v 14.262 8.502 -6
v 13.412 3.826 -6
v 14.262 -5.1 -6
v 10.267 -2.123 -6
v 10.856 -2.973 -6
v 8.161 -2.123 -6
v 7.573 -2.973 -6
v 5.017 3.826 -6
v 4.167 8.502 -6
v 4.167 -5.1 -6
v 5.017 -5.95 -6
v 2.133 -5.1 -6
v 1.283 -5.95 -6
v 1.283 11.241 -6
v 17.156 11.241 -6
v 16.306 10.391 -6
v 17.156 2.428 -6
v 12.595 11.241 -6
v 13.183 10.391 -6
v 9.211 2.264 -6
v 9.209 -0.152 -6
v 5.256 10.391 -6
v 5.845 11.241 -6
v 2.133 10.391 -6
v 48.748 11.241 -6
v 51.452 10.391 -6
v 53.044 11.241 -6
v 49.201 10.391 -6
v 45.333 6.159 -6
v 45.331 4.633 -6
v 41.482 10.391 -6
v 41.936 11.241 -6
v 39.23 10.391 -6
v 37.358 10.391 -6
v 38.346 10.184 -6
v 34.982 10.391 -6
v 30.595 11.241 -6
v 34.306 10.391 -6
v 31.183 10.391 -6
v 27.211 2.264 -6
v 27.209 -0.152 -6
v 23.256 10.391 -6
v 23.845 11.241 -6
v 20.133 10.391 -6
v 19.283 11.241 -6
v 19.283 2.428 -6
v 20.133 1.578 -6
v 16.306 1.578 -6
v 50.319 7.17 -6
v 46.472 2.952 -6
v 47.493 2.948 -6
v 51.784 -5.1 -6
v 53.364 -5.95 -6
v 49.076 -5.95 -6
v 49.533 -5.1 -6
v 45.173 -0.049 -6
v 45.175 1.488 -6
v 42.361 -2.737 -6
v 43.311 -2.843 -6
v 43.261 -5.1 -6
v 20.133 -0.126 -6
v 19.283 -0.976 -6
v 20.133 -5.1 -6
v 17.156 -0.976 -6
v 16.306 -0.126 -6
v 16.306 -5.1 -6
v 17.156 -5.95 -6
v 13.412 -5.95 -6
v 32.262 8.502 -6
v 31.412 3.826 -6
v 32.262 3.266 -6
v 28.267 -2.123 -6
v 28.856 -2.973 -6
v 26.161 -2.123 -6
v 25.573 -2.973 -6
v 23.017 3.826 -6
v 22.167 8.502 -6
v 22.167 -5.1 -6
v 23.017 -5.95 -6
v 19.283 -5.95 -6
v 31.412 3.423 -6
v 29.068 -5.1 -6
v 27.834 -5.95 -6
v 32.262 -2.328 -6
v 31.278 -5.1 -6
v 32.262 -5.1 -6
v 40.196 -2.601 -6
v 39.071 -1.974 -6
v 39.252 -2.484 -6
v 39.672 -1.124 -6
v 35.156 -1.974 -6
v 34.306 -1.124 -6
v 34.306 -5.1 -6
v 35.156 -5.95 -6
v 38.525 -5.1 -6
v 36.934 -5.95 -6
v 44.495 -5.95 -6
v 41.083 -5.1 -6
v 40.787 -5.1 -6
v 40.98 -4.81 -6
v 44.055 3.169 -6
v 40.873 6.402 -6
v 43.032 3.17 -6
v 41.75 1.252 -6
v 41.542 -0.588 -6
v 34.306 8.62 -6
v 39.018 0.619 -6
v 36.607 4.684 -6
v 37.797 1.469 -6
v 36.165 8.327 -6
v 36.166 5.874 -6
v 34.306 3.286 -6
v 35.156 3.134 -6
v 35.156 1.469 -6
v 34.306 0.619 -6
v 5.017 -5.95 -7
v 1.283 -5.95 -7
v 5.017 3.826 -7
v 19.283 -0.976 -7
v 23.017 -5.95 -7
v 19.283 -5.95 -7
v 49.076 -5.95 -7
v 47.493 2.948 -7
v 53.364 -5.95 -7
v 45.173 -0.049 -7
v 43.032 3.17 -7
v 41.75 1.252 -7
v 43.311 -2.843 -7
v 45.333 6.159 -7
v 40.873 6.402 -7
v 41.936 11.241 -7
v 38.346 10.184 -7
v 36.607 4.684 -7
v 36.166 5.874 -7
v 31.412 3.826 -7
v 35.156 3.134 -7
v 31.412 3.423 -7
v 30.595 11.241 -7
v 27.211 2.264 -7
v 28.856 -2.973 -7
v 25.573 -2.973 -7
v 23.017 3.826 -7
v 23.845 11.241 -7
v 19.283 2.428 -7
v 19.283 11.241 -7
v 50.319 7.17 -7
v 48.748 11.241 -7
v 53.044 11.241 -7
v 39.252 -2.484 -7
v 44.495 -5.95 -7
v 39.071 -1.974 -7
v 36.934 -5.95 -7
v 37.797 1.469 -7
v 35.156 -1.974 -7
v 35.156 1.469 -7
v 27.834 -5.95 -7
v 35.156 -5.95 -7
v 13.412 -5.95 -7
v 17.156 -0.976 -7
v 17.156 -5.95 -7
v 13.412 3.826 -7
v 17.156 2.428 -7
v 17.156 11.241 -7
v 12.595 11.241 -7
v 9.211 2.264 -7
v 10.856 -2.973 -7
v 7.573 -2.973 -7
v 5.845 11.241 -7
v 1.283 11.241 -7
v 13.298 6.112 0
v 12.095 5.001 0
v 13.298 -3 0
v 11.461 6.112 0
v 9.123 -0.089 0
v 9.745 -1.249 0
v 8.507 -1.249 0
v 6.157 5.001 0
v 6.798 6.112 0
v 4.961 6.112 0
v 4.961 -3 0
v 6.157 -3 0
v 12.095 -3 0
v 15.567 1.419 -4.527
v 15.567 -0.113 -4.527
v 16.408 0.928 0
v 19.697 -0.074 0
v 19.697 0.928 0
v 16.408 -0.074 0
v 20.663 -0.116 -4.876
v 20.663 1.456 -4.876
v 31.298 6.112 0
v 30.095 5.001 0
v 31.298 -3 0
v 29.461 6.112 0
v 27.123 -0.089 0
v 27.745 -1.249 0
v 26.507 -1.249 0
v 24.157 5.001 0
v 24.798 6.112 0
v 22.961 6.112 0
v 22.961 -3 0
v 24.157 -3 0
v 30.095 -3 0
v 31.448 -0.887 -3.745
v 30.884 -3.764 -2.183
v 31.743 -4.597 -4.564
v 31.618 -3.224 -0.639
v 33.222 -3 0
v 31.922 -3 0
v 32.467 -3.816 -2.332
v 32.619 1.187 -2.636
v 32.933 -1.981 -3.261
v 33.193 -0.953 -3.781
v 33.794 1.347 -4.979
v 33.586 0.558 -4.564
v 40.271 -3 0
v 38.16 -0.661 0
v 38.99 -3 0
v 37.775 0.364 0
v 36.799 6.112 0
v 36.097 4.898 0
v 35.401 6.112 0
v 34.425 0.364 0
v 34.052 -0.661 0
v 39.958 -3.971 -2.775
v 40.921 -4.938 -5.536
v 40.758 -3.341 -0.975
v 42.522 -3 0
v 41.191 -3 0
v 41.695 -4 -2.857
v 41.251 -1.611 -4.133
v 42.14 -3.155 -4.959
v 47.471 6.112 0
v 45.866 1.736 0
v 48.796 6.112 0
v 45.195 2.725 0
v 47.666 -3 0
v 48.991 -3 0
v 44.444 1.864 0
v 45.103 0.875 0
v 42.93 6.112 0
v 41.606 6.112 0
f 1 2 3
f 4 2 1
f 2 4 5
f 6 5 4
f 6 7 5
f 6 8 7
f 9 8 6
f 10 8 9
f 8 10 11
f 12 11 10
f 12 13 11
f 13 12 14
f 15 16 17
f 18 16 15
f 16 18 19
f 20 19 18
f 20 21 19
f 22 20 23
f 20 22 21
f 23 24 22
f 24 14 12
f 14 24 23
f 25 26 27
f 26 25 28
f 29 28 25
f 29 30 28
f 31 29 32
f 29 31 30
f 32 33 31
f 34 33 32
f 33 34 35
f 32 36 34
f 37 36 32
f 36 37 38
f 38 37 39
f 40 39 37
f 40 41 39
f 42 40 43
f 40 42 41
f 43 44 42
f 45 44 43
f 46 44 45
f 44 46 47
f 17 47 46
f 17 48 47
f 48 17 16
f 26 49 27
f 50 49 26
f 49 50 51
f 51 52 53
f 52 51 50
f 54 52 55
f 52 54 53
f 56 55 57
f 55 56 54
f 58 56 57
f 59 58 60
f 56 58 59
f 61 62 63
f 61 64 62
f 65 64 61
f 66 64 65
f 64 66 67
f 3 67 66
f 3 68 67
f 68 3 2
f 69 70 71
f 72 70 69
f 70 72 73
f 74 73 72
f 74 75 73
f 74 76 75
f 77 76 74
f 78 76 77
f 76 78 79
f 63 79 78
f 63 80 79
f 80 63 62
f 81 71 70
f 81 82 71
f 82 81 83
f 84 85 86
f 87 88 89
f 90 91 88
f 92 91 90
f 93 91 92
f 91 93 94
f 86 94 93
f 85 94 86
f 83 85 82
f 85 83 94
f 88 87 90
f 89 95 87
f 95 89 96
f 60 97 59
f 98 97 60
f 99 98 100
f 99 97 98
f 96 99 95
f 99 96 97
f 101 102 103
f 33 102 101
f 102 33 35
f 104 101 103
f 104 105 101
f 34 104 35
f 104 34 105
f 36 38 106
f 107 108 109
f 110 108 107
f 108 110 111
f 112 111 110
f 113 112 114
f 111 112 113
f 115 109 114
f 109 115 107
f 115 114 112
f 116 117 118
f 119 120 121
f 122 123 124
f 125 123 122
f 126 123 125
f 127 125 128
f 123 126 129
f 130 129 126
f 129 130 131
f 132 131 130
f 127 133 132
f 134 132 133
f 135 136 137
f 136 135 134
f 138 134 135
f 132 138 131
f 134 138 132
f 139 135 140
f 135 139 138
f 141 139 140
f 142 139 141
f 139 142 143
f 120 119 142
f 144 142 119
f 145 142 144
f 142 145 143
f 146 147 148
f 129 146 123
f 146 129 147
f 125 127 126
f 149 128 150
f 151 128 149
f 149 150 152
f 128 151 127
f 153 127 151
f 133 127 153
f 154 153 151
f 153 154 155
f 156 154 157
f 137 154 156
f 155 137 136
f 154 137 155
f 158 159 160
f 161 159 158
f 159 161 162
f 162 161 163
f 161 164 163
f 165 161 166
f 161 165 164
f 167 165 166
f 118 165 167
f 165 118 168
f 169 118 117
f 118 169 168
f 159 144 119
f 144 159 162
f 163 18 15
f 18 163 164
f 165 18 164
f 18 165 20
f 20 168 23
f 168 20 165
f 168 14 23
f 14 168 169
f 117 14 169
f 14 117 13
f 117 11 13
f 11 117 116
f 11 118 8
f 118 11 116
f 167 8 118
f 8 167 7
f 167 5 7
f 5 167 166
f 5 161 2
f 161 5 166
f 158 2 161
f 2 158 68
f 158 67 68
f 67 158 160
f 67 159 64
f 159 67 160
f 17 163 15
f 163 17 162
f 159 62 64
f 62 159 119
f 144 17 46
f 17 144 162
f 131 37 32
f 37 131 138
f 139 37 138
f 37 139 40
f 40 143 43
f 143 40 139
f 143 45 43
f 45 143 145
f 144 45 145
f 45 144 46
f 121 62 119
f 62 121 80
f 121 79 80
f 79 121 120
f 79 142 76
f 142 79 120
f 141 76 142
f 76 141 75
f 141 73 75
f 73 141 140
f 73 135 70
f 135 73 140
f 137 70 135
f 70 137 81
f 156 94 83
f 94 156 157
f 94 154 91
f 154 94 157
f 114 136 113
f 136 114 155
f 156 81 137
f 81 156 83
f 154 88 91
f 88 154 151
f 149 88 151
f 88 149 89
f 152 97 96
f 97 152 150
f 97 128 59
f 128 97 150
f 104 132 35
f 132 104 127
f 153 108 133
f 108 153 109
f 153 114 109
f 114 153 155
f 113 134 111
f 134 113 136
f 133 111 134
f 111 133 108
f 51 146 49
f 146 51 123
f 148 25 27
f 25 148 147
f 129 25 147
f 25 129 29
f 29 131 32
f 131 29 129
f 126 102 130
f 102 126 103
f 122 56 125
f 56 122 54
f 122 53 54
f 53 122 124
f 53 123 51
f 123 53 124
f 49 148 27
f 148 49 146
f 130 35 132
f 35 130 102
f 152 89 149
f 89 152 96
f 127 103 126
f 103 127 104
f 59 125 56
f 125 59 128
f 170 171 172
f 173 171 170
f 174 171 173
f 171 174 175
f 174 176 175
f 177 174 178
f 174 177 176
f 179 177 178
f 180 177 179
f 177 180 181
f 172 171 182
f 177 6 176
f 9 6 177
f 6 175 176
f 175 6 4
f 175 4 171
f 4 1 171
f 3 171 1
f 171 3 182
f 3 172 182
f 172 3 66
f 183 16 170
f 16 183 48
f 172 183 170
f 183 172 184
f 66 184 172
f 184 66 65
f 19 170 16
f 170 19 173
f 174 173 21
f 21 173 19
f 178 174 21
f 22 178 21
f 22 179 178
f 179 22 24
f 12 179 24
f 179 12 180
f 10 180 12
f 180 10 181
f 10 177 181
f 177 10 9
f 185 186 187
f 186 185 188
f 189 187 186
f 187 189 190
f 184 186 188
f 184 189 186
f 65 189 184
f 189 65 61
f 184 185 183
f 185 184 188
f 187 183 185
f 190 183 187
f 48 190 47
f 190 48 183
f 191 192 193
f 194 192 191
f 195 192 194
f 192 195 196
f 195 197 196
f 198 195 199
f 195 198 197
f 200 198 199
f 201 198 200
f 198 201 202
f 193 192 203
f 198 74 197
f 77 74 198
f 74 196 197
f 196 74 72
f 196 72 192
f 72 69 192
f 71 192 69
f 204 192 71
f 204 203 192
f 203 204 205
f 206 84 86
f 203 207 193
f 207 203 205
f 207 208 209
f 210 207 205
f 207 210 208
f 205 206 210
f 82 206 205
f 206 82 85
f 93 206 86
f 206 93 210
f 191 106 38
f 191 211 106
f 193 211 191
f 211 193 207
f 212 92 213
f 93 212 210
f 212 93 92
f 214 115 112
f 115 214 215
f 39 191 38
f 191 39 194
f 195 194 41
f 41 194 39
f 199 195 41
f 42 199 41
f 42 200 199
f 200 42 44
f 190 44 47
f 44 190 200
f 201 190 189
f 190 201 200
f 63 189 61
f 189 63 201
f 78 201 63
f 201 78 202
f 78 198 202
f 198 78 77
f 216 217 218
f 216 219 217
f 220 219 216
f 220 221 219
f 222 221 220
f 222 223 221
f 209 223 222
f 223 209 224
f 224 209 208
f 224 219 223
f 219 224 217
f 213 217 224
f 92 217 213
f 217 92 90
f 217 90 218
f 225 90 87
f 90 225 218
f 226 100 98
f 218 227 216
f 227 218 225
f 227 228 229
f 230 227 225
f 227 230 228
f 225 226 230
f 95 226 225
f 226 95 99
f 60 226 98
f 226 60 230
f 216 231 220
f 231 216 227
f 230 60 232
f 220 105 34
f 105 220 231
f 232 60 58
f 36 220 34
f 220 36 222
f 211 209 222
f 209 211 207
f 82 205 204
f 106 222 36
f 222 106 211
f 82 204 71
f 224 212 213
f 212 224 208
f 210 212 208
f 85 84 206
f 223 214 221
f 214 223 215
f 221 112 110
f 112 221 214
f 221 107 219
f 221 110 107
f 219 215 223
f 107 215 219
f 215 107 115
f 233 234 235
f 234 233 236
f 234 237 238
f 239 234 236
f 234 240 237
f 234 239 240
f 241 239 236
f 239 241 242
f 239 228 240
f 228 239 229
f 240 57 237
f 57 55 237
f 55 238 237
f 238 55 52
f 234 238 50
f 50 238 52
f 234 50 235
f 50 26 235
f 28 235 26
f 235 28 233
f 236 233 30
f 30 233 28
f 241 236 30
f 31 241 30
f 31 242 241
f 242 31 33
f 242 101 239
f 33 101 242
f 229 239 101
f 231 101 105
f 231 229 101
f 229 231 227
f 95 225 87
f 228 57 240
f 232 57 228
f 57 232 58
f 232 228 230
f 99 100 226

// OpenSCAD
// https://www.thingiverse.com/thing:3089014
// removed the inlcuded fontlist that wasn't on my pc 9/8/18

//Set the text to render
textstring="M-MAX";

//Font name
fontname= "Old English Text MT:style=Regular"; // pick from font list off of help menu


//type
type="tag"; //[container, tag, hollow]

//where to extrude
shiftit=0.3;

//scaling up
scale=1.7;

//Text height (extrusion) in mm
textheight=6;

//Set font size in mm
textsize=10; 

//wall thickness
wall=1;

//text kerning - in font size
width_factor=.9;

//rim to combine the text
rim=0.5;

//close gaps e.g. to the dot of an i...
delta=0.5;
    


/* [Hidden] */
//-------------------------------------------------------------------------------
function is_monospaced() = 
    (fontname=="Cutive Mono" || fontname=="Droid Sans Mono" ||fontname=="Fira Mono" ||fontname=="Nova Mono" ||fontname=="PT Mono" ||fontname=="Rubik Mono" ||fontname=="Share Tech Mono" ||fontname=="Ubuntu Mono" )? 1 : 0;

echo (is_monospaced()) ;
width_big=textsize*width_factor;
width_small=textsize*width_factor*(is_monospaced()?1:.75);
width_tiny=textsize*width_factor*(is_monospaced()?1:.25);

function is_narrow_letter(c) =
    (c=="t" ||c=="f" || c=="l" || c=="i" || c=="j") ? 1 : 0;
function is_space(c) =
    (c=="." ||c==";" || c==" ") ? 1 : 0;
function width(c,d) = 
    (is_narrow_letter(c)==1 && is_narrow_letter(d)==1) ? width_small/2 : 
    (is_narrow_letter(c)==1 || is_narrow_letter(d)==1) ? width_small : 
    (is_space(c)==1 && is_space(d)==1) ? width_tiny/2 : 
    (is_space(c)==1 || is_space(d)==1) ? width_tiny : 
    width_big;
    
function widthfunction(i) = width(textstring[i-1],textstring[i-2]);
function totalwidthfunction(x) = x < 1 ? 0 : widthfunction(x) + totalwidthfunction(x - 1);
//input = [1, 3, 5, 8];
width = [for (a = [ 1 : len(textstring) ]) totalwidthfunction(a) ];
echo(width); // ECHO: [1, 6, 15, 36]

dummy_cutoutlen=len(textstring)*textsize;

/*
Customizable Text Storage Box
Version 7, November 2017
Written by MC Geisler (mcgenki at gmail dot com)

If you need to store Stuff in letters, this is the way to go.
Each letter and also the dots of 'i' and 'j' are connected together, so after printing it will not fall apart.
Have fun!

License: Attribution 4.0 International (CC BY 4.0)

You are free to:
    Share - copy and redistribute the material in any medium or format
    Adapt - remix, transform, and build upon the material
    for any purpose, even commercially.
*/

    
module writetext(textstr, sizeit)
{
    text(textstr,size=sizeit*.9,font=fontname,halign="center",valign="baseline");
}

module RiseText(textstr, textsize,textheight) 
{
    difference()
    {
        union()
        {
            for(i=[0:1:len(textstr)-1])
            {
                //extruded text
                translate([width[i],0,0])
                    linear_extrude(height=textheight,convexity = 32, scale = scale)
                        translate([0,-textsize*shiftit,0])
                            writetext(textstr[i], textsize);
                               
                //backplane
                if(type=="tag")
                {
                    translate([width[i],0,textheight-0*wall])
                        linear_extrude(height=wall,convexity = 32)
                            scale([scale,scale,1])
                                translate([0,-textsize*shiftit,0])
                                    offset(delta=-delta)   
                                        offset(delta=delta+rim)
                                            writetext(textstr[i], textsize);     


                    translate([width[i],0,textheight-0*wall])
                        linear_extrude(height=wall,convexity = 32)
                                    scale([scale,scale,1])
                                       translate([0,-textsize*shiftit,0])
                                            offset(delta=rim)
                                                writetext(textstr[i], textsize);      
                }
            }

        
        }

        if (type=="container")
        {
            translate([0,0,wall])
                for(i=[0:1:len(textstr)-1])
                {
                    translate([width[i],0,0])
                        linear_extrude(height=textheight,convexity = 32, scale = scale)
                            translate([0,-textsize*shiftit,0])
                                offset(delta=-wall)
                                    writetext(textstr[i], textsize);
                }
        }
    
 
        if (type=="hollow")
        scale([1,1,1])
            translate([0,0,-wall])
                for(i=[0:1:len(textstr)-1])
                {
                    translate([width[i],0,0])
                        linear_extrude(height=textheight,convexity = 32, scale = 0.3)
                            translate([0,-textsize*shiftit,0])
                               //offset(delta=-wall)
                                    writetext(textstr[i], textsize);
                }
    
    
    }
}


if (type=="tag" || type=="hollow")
{
   scale([1,1,-1])
        RiseText(textstring,textsize,textheight);
}
else
{
    RiseText(textstring,textsize,textheight);
}
